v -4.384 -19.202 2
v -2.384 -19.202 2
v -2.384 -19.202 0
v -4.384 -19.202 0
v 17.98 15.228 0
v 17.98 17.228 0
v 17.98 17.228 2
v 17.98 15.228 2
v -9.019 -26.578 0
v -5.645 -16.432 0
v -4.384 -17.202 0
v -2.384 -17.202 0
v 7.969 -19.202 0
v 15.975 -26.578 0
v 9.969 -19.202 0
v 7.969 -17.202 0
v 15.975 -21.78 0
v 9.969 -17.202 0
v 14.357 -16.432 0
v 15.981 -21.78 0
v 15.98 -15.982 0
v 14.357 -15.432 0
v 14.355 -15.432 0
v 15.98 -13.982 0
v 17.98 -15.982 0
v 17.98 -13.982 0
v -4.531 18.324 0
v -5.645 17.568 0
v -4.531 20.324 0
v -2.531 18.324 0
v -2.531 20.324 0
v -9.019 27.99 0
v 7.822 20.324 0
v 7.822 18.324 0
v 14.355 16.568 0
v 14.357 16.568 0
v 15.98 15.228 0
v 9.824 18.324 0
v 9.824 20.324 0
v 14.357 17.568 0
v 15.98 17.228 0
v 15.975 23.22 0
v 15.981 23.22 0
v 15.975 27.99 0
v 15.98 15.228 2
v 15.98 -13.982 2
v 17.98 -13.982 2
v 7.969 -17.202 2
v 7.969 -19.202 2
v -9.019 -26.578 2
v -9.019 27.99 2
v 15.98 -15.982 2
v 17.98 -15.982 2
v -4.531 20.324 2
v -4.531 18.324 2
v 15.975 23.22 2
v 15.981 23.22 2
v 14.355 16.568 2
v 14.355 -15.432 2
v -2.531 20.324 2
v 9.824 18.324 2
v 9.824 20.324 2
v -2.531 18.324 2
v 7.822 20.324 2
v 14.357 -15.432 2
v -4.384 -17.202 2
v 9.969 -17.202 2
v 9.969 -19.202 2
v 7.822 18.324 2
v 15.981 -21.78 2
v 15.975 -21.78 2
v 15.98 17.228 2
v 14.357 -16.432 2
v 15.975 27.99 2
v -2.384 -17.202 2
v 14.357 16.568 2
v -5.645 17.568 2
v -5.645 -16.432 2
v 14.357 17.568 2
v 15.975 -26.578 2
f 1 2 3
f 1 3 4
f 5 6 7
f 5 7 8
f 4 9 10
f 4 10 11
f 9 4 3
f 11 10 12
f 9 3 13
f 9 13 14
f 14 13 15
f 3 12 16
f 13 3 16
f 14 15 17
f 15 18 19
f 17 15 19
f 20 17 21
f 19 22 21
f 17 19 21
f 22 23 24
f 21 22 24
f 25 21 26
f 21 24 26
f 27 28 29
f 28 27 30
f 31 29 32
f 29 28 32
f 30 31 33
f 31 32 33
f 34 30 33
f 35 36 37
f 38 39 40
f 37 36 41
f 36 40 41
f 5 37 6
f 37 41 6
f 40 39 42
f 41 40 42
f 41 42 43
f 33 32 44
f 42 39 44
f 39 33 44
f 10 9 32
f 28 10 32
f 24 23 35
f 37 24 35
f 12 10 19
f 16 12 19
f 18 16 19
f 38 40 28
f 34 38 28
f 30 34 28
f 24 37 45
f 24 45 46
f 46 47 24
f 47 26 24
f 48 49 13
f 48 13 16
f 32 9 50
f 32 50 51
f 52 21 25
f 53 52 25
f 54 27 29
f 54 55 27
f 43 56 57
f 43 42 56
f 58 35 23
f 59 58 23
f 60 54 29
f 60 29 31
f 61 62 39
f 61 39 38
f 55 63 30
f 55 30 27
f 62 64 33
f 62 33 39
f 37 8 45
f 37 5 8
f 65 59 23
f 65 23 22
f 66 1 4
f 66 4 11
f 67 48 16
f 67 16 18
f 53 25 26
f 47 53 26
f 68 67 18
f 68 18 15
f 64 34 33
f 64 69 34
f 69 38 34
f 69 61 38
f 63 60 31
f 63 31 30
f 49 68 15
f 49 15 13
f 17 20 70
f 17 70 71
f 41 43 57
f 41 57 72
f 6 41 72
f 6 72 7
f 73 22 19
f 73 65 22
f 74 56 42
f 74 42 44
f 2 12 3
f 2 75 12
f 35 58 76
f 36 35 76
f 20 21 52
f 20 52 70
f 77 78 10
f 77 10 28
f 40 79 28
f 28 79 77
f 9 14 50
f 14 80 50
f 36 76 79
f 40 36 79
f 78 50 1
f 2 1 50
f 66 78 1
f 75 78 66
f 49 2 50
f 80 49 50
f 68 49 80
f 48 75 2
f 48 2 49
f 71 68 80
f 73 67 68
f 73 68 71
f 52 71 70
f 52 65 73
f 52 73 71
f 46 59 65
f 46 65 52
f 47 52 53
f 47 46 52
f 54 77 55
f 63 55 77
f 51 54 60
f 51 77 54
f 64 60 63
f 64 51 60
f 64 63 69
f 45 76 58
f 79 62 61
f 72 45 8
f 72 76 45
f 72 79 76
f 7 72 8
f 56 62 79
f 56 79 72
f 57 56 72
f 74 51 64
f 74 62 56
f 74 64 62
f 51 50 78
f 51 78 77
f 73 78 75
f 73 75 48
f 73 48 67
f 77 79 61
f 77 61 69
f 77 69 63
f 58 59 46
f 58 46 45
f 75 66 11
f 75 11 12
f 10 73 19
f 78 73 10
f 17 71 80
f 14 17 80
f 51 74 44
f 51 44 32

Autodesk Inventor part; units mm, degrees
ref_plane "YZ Plane" through (0, 0, 0) normal (1, 0, 0) x (0, 1, 0)
ref_plane "XZ Plane" through (0, 0, 0) normal (0, 1, 0) x (-1, 0, 0)
ref_plane "XY Plane" through (0, 0, 0) normal (0, 0, 1) x (1, 0, 0)
sketch "Sketch1" plane through (0, 0, 0) normal (0, 0, 1) x (1, 0, 0)
  line L0 (-9.019, 23.22) -> (15.981, 23.22)
  line L1 (15.981, 23.22) -> (15.981, -21.78)
  line L2 (15.981, -21.78) -> (-9.019, -21.78)
  line L3 (-9.019, -21.78) -> (-9.019, 23.22)
  line L4 (-5.6447, 21.5683) -> (14.3553, 21.5683)
  line L5 (14.3553, 21.5683) -> (14.3553, -20.4317)
  line L6 (14.3553, -20.4317) -> (-5.6447, -20.4317)
  line L7 (-5.6447, -20.4317) -> (-5.6447, 21.5683)
  line L8 (17.9795, 15.2281) -> (17.9795, -13.9821)
  line L9 (17.9795, 15.2281) -> (15.9795, 15.2281)
  line L10 (15.9795, 15.2281) -> (15.9795, 17.2281)
  line L11 (15.9795, 17.2281) -> (17.9795, 17.2281)
  line L12 (17.9795, 17.2281) -> (17.9795, 15.2281)
  line L13 (17.9795, -13.9821) -> (15.9795, -13.9821)
  line L14 (15.9795, -13.9821) -> (15.9795, -15.9821)
  line L15 (15.9795, -15.9821) -> (17.9795, -15.9821)
  line L16 (17.9795, -15.9821) -> (17.9795, -13.9821)
  point P0 (0, 0)
  dimension "d0" = 25
  dimension "d2" = 20
  dimension "d4" = 29.2102
  dimension "d5" = 2
  dimension "d6" = 2
  dimension "d7" = 2
  dimension "d8" = 2
extrude "Extrusion1" add sketch "Sketch1" along normal blind 2 contours L0 L1 L2 L3 | L11 L12 L9 L1 | L1 L13 L16 L15
sketch "Sketch2" plane through (0, 0, 2) normal (0, 0, 1) x (1, 0, 0)
  line L0 (-9.019, 23.22) -> (-9.019, -21.78) projected
  line L1 (-9.019, -21.78) -> (15.9746, -21.78)
  line L2 (15.9746, -21.78) -> (15.9746, -26.578)
  line L3 (15.9746, -26.578) -> (-9.019, -26.578)
  line L4 (-9.019, -26.578) -> (-9.019, -21.78)
  line L5 (-9.019, 23.22) -> (15.981, 23.22) projected
  line L6 (-9.019, 23.22) -> (15.9746, 23.22)
  line L7 (15.9746, 23.22) -> (15.9746, 27.9895)
  line L8 (15.9746, 27.9895) -> (-9.019, 27.9895)
  line L9 (-9.019, 27.9895) -> (-9.019, 23.22)
  point P0 (0, 0)
extrude "Extrusion2" add sketch "Sketch2" against normal blind 2
sketch "Sketch3" plane through (0, 0, 2) normal (0, 0, 1) x (1, 0, 0)
  line L0 (-5.6447, -20.4317) -> (14.3553, -20.4317) projected
  line L1 (14.3553, -20.4317) -> (14.3553, 21.5683) projected
  line L2 (-5.6447, -20.4317) -> (14.3553, -20.4317)
  line L3 (14.3553, -20.4317) -> (14.3553, -15.4317)
  line L4 (14.3553, -15.4317) -> (-5.6447, -15.4317)
  line L5 (-5.6447, -15.4317) -> (-5.6447, -20.4317)
  line L6 (-5.6447, 21.5683) -> (-5.6447, -20.4317) projected
  line L7 (-5.6447, 21.5683) -> (14.3553, 21.5683)
  line L8 (14.3553, 21.5683) -> (14.3553, 16.5683)
  line L9 (14.3553, 16.5683) -> (-5.6447, 16.5683)
  line L10 (-5.6447, 16.5683) -> (-5.6447, 21.5683)
  point P0 (0, 0)
  dimension "d13" = 5
  dimension "d14" = 5
extrude "Extrusion3" add sketch "Sketch3" against normal blind 2 contours L5 L4 L1 L0 | L6 L7 L1 L9
sketch "Sketch4" plane through (0, 0, 2) normal (0, 0, 1) x (1, 0, 0)
  point P0 (0, 0)
sketch "Sketch5" plane through (0, 0, 2) normal (0, 0, 1) x (1, 0, 0)
  line L0 (-5.6447, -15.4317) -> (14.3572, -15.4317)
  line L1 (14.3572, -15.4317) -> (14.3572, -16.4317)
  line L2 (14.3572, -16.4317) -> (-5.6447, -16.4317)
  line L3 (-5.6447, -16.4317) -> (-5.6447, -15.4317)
  line L4 (-5.6447, -15.4317) -> (-5.6447, 16.5683) projected
  line L5 (-5.6447, 16.5683) -> (14.3572, 16.5683)
  line L6 (14.3572, 16.5683) -> (14.3572, 17.5683)
  line L7 (14.3572, 17.5683) -> (-5.6447, 17.5683)
  line L8 (-5.6447, 17.5683) -> (-5.6447, 16.5683)
  point P0 (0, 0)
  dimension "d17" = 1
  dimension "d18" = 1
extrude "Extrusion4" cut sketch "Sketch5" against normal blind 2
sketch "Sketch6" plane through (0, 0, 2) normal (0, 0, 1) x (1, 0, 0)
  point P0 (0, 0)
sketch "Sketch7" plane through (0, 0, 2) normal (0, 0, 1) x (1, 0, 0)
  line L0 (-4.5311, 20.3235) -> (-2.5311, 20.3235)
  line L1 (-2.5311, 20.3235) -> (-2.5311, 18.3235)
  line L2 (-2.5311, 18.3235) -> (-4.5311, 18.3235)
  line L3 (-4.5311, 18.3235) -> (-4.5311, 20.3235)
  line L4 (-2.5311, 19.3235) -> (7.8219, 19.3235)
  line L5 (7.8219, 20.3235) -> (9.8242, 20.3235)
  line L6 (9.8242, 20.3235) -> (9.8242, 18.3235)
  line L7 (9.8242, 18.3235) -> (7.8219, 18.3235)
  line L8 (7.8219, 18.3235) -> (7.8219, 20.3235)
  point P0 (0, 0)
  dimension "d21" = 2
  dimension "d22" = 2
  dimension "d23" = 10.353
extrude "Extrusion5" cut sketch "Sketch7" against normal blind 10
sketch "Sketch8" plane through (0, 0, 2) normal (0, 0, 1) x (1, 0, 0)
  line L0 (14.3572, -16.4317) -> (-5.6447, -16.4317) projected
  line L1 (-4.3843, -16.4317) -> (-4.3843, -17.2017)
  line L2 (-4.3843, -17.2017) -> (-2.3843, -17.2017)
  line L3 (-2.3843, -17.2017) -> (-2.3843, -19.2017)
  line L4 (-2.3843, -19.2017) -> (-4.3843, -19.2017)
  line L5 (-4.3843, -19.2017) -> (-4.3843, -17.2017)
  line L6 (-2.3843, -18.2017) -> (7.9687, -18.2017)
  line L7 (7.9687, -17.2017) -> (9.9687, -17.2017)
  line L8 (9.9687, -17.2017) -> (9.9687, -19.2017)
  line L9 (9.9687, -19.2017) -> (7.9687, -19.2017)
  line L10 (7.9687, -19.2017) -> (7.9687, -17.2017)
  point P0 (0, 0)
  dimension "d26" = 0.77
  dimension "d27" = 2
  dimension "d28" = 2
  dimension "d29" = 10.353
  dimension "d30" = 2
extrude "Extrusion6" cut sketch "Sketch8" against normal blind 10
sketch "Sketch9" plane through (0, 0, 2) normal (0, 0, 1) x (1, 0, 0)
  point P0 (0, 0)
properties part number "openslotforclamp"
